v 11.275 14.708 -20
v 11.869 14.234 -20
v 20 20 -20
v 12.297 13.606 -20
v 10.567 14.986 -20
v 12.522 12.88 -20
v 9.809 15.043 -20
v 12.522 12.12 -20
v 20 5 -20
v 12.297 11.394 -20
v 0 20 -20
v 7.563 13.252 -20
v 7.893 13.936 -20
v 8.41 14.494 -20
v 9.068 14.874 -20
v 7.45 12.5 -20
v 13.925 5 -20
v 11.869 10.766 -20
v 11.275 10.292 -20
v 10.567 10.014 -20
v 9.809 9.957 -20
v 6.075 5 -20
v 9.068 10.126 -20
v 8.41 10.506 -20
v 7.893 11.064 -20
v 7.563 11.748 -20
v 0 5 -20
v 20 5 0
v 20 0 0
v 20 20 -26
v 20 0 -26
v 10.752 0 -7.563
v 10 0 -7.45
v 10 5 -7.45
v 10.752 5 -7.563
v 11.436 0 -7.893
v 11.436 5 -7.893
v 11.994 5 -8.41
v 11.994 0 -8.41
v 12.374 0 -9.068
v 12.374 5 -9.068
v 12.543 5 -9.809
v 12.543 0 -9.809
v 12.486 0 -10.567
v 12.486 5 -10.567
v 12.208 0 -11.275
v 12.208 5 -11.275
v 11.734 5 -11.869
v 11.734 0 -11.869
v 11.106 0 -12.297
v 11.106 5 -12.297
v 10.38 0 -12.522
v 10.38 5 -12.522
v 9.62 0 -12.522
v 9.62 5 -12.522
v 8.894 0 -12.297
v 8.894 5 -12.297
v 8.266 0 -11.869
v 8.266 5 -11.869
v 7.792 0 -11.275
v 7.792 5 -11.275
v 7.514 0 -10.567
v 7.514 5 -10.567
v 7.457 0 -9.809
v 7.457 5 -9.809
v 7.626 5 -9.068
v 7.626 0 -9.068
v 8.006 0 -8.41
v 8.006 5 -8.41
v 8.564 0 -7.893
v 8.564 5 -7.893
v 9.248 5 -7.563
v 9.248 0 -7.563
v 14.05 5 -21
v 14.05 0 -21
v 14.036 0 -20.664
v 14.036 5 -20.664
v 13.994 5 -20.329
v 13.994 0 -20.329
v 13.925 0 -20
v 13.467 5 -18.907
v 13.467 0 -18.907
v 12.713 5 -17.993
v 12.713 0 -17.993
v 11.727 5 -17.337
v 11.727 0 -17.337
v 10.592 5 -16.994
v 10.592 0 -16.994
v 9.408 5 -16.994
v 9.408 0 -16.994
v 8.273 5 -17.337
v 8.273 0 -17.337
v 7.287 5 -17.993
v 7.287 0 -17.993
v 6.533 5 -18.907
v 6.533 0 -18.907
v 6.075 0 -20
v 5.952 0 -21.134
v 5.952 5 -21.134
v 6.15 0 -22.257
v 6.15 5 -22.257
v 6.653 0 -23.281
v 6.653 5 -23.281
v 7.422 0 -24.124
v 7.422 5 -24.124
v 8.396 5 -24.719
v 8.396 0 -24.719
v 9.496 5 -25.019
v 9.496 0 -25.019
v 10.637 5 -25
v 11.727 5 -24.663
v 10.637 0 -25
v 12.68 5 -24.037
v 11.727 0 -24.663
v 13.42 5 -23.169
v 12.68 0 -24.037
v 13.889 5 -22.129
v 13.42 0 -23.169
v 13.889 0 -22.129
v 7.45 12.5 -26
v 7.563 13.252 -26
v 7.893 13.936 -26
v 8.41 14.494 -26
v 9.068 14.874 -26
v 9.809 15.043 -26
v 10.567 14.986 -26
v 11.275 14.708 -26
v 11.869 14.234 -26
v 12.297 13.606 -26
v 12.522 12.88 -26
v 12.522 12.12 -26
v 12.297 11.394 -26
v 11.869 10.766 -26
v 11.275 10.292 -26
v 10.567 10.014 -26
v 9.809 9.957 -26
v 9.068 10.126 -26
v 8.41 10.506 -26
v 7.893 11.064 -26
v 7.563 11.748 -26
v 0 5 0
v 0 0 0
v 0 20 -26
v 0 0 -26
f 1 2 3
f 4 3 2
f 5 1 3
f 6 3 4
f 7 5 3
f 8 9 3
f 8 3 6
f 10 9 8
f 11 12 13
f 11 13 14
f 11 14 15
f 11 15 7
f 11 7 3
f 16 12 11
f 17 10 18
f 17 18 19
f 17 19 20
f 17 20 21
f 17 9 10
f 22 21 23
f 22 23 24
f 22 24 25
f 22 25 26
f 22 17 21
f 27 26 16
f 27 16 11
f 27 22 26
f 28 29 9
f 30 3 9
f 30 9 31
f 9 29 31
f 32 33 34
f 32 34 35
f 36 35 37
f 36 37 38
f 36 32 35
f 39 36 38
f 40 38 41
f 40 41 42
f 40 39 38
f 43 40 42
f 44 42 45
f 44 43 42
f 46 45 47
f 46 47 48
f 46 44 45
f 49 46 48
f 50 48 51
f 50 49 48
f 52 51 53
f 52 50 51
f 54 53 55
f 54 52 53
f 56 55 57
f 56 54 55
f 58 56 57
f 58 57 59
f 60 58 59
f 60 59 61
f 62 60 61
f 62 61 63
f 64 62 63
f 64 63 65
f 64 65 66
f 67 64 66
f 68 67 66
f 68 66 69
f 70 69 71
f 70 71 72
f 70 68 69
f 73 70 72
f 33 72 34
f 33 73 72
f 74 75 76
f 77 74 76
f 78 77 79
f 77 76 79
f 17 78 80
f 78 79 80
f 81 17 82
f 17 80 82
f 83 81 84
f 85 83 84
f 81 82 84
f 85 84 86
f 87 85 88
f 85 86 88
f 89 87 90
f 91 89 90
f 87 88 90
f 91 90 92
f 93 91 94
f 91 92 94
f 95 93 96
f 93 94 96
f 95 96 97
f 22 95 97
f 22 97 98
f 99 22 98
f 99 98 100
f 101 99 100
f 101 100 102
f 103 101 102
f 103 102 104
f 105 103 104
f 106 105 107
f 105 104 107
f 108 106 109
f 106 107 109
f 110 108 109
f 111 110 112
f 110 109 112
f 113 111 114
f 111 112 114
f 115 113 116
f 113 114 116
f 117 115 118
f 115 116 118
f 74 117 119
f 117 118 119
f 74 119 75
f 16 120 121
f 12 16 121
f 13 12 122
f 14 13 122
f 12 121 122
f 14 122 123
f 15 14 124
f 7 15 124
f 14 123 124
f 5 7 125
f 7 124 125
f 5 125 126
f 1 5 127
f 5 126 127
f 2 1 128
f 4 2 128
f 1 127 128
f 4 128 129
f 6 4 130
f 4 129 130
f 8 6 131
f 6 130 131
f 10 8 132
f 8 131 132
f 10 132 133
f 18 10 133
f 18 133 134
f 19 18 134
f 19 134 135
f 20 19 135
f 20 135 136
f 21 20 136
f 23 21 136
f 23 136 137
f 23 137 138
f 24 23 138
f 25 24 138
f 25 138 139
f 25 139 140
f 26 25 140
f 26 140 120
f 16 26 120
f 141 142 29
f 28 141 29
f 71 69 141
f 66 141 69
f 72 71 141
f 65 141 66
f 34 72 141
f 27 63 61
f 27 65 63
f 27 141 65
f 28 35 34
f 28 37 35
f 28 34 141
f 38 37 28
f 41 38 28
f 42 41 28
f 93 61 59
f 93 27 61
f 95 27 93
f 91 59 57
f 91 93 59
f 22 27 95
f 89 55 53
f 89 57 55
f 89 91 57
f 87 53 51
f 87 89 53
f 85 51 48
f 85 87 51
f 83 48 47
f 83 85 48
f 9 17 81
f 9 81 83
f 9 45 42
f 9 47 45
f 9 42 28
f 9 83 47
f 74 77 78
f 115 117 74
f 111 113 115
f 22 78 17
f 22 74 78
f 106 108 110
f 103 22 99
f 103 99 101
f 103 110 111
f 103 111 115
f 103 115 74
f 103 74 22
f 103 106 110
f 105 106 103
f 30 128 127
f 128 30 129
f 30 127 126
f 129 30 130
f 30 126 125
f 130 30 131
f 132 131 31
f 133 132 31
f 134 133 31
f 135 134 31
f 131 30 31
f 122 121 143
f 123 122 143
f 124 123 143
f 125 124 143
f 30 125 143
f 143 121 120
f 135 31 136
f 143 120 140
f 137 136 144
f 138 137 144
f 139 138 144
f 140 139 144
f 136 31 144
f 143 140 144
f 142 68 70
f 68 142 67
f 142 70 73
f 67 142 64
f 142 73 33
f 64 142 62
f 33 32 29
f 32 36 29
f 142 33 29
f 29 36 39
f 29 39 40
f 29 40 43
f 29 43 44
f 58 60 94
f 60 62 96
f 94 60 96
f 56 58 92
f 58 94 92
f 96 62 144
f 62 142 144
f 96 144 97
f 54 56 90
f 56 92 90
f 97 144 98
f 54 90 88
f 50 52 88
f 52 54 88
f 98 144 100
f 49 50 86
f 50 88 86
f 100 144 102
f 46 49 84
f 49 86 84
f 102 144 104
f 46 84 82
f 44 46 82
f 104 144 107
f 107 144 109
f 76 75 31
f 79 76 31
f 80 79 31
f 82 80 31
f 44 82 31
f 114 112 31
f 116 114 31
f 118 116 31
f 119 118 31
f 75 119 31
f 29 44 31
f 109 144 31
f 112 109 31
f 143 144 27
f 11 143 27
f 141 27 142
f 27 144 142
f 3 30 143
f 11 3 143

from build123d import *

# Parameters (mm, degrees)
SKETCH1_R           = 2.55
BOSS_EXTRUDE1_DEPTH = 5
BOSS_EXTRUDE2_DEPTH = 20
BOSS_EXTRUDE3_DEPTH = 15
CUT_EXTRUDE1_DEPTH  = 39.418745425


with BuildPart() as part:
    # Sketch1 → Boss-Extrude1 (new body)
    # profile 1 of 2: a face of its own
    with BuildSketch(Plane(origin=(0, 0, 0), x_dir=(1, 0, 0), z_dir=(0, 1, 0))):
        with BuildLine():
            Line((6.075398109, 20), (0, 20))
            Line((0, 20), (0, 0))
            Line((0, 0), (20, 0))
            Line((20, 0), (20, 20))
            Line((20, 20), (13.924601891, 20))
            ThreePointArc((13.924601891, 20), (10, 16.95), (6.075398109, 20))
        make_face()
        with Locations(Location((10, 10, 0), (0, 0, 270))):
            Circle(SKETCH1_R, mode=Mode.SUBTRACT)
    # profile 2 of 2: a face of its own
    with BuildSketch(Plane(origin=(0, 0, 0), x_dir=(1, 0, 0), z_dir=(0, 1, 0))):
        with BuildLine():
            Line((0, 26), (0, 20))
            Line((0, 20), (6.075398109, 20))
            ThreePointArc((6.075398109, 20), (9.496084162, 25.018528192), (14.05, 21))
            ThreePointArc((14.05, 21), (14.018528192, 20.496084162), (13.924601891, 20))
            Line((13.924601891, 20), (20, 20))
            Line((20, 20), (20, 26))
            Line((20, 26), (0, 26))
        make_face()
    extrude(amount=BOSS_EXTRUDE1_DEPTH)

    # Sketch1<3> → Boss-Extrude2 (add)
    with BuildSketch(Plane(origin=(0, 0, 0), x_dir=(1, 0, 0), z_dir=(0, 1, 0))):
        with BuildLine():
            Line((0, 26), (0, 20))
            Line((0, 20), (6.075398109, 20))
            ThreePointArc((6.075398109, 20), (9.496084162, 25.018528192), (14.05, 21))
            ThreePointArc((14.05, 21), (14.018528192, 20.496084162), (13.924601891, 20))
            Line((13.924601891, 20), (20, 20))
            Line((20, 20), (20, 26))
            Line((20, 26), (0, 26))
        make_face()
    extrude(amount=BOSS_EXTRUDE2_DEPTH)

    # Sketch3 → Boss-Extrude3 (add)
    with BuildSketch(Plane(origin=(0, 5, 0), x_dir=(1, 0, 0), z_dir=(0, 1, 0))):
        with BuildLine():
            Line((13.924601891, 20), (6.075398109, 20))
            ThreePointArc((6.075398109, 20), (10, 25.05), (13.924601891, 20))
        make_face()
    extrude(amount=BOSS_EXTRUDE3_DEPTH)

    # Sketch2 → Cut-Extrude1 (cut, through all)
    with BuildSketch(Plane(origin=(0, 0, -26), x_dir=(-1, 0, 0), z_dir=(0, 0, -1))):
        with BuildLine():
            ThreePointArc((-12.55, 12.5), (-10, 9.95), (-7.45, 12.5))
            Line((-7.45, 12.5), (-12.55, 12.5))
        make_face()
        with BuildLine():
            Line((-12.55, 12.5), (-7.45, 12.5))
            ThreePointArc((-7.45, 12.5), (-10, 15.05), (-12.55, 12.5))
        make_face()
    extrude(amount=-CUT_EXTRUDE1_DEPTH, mode=Mode.SUBTRACT)


solid = part.part
